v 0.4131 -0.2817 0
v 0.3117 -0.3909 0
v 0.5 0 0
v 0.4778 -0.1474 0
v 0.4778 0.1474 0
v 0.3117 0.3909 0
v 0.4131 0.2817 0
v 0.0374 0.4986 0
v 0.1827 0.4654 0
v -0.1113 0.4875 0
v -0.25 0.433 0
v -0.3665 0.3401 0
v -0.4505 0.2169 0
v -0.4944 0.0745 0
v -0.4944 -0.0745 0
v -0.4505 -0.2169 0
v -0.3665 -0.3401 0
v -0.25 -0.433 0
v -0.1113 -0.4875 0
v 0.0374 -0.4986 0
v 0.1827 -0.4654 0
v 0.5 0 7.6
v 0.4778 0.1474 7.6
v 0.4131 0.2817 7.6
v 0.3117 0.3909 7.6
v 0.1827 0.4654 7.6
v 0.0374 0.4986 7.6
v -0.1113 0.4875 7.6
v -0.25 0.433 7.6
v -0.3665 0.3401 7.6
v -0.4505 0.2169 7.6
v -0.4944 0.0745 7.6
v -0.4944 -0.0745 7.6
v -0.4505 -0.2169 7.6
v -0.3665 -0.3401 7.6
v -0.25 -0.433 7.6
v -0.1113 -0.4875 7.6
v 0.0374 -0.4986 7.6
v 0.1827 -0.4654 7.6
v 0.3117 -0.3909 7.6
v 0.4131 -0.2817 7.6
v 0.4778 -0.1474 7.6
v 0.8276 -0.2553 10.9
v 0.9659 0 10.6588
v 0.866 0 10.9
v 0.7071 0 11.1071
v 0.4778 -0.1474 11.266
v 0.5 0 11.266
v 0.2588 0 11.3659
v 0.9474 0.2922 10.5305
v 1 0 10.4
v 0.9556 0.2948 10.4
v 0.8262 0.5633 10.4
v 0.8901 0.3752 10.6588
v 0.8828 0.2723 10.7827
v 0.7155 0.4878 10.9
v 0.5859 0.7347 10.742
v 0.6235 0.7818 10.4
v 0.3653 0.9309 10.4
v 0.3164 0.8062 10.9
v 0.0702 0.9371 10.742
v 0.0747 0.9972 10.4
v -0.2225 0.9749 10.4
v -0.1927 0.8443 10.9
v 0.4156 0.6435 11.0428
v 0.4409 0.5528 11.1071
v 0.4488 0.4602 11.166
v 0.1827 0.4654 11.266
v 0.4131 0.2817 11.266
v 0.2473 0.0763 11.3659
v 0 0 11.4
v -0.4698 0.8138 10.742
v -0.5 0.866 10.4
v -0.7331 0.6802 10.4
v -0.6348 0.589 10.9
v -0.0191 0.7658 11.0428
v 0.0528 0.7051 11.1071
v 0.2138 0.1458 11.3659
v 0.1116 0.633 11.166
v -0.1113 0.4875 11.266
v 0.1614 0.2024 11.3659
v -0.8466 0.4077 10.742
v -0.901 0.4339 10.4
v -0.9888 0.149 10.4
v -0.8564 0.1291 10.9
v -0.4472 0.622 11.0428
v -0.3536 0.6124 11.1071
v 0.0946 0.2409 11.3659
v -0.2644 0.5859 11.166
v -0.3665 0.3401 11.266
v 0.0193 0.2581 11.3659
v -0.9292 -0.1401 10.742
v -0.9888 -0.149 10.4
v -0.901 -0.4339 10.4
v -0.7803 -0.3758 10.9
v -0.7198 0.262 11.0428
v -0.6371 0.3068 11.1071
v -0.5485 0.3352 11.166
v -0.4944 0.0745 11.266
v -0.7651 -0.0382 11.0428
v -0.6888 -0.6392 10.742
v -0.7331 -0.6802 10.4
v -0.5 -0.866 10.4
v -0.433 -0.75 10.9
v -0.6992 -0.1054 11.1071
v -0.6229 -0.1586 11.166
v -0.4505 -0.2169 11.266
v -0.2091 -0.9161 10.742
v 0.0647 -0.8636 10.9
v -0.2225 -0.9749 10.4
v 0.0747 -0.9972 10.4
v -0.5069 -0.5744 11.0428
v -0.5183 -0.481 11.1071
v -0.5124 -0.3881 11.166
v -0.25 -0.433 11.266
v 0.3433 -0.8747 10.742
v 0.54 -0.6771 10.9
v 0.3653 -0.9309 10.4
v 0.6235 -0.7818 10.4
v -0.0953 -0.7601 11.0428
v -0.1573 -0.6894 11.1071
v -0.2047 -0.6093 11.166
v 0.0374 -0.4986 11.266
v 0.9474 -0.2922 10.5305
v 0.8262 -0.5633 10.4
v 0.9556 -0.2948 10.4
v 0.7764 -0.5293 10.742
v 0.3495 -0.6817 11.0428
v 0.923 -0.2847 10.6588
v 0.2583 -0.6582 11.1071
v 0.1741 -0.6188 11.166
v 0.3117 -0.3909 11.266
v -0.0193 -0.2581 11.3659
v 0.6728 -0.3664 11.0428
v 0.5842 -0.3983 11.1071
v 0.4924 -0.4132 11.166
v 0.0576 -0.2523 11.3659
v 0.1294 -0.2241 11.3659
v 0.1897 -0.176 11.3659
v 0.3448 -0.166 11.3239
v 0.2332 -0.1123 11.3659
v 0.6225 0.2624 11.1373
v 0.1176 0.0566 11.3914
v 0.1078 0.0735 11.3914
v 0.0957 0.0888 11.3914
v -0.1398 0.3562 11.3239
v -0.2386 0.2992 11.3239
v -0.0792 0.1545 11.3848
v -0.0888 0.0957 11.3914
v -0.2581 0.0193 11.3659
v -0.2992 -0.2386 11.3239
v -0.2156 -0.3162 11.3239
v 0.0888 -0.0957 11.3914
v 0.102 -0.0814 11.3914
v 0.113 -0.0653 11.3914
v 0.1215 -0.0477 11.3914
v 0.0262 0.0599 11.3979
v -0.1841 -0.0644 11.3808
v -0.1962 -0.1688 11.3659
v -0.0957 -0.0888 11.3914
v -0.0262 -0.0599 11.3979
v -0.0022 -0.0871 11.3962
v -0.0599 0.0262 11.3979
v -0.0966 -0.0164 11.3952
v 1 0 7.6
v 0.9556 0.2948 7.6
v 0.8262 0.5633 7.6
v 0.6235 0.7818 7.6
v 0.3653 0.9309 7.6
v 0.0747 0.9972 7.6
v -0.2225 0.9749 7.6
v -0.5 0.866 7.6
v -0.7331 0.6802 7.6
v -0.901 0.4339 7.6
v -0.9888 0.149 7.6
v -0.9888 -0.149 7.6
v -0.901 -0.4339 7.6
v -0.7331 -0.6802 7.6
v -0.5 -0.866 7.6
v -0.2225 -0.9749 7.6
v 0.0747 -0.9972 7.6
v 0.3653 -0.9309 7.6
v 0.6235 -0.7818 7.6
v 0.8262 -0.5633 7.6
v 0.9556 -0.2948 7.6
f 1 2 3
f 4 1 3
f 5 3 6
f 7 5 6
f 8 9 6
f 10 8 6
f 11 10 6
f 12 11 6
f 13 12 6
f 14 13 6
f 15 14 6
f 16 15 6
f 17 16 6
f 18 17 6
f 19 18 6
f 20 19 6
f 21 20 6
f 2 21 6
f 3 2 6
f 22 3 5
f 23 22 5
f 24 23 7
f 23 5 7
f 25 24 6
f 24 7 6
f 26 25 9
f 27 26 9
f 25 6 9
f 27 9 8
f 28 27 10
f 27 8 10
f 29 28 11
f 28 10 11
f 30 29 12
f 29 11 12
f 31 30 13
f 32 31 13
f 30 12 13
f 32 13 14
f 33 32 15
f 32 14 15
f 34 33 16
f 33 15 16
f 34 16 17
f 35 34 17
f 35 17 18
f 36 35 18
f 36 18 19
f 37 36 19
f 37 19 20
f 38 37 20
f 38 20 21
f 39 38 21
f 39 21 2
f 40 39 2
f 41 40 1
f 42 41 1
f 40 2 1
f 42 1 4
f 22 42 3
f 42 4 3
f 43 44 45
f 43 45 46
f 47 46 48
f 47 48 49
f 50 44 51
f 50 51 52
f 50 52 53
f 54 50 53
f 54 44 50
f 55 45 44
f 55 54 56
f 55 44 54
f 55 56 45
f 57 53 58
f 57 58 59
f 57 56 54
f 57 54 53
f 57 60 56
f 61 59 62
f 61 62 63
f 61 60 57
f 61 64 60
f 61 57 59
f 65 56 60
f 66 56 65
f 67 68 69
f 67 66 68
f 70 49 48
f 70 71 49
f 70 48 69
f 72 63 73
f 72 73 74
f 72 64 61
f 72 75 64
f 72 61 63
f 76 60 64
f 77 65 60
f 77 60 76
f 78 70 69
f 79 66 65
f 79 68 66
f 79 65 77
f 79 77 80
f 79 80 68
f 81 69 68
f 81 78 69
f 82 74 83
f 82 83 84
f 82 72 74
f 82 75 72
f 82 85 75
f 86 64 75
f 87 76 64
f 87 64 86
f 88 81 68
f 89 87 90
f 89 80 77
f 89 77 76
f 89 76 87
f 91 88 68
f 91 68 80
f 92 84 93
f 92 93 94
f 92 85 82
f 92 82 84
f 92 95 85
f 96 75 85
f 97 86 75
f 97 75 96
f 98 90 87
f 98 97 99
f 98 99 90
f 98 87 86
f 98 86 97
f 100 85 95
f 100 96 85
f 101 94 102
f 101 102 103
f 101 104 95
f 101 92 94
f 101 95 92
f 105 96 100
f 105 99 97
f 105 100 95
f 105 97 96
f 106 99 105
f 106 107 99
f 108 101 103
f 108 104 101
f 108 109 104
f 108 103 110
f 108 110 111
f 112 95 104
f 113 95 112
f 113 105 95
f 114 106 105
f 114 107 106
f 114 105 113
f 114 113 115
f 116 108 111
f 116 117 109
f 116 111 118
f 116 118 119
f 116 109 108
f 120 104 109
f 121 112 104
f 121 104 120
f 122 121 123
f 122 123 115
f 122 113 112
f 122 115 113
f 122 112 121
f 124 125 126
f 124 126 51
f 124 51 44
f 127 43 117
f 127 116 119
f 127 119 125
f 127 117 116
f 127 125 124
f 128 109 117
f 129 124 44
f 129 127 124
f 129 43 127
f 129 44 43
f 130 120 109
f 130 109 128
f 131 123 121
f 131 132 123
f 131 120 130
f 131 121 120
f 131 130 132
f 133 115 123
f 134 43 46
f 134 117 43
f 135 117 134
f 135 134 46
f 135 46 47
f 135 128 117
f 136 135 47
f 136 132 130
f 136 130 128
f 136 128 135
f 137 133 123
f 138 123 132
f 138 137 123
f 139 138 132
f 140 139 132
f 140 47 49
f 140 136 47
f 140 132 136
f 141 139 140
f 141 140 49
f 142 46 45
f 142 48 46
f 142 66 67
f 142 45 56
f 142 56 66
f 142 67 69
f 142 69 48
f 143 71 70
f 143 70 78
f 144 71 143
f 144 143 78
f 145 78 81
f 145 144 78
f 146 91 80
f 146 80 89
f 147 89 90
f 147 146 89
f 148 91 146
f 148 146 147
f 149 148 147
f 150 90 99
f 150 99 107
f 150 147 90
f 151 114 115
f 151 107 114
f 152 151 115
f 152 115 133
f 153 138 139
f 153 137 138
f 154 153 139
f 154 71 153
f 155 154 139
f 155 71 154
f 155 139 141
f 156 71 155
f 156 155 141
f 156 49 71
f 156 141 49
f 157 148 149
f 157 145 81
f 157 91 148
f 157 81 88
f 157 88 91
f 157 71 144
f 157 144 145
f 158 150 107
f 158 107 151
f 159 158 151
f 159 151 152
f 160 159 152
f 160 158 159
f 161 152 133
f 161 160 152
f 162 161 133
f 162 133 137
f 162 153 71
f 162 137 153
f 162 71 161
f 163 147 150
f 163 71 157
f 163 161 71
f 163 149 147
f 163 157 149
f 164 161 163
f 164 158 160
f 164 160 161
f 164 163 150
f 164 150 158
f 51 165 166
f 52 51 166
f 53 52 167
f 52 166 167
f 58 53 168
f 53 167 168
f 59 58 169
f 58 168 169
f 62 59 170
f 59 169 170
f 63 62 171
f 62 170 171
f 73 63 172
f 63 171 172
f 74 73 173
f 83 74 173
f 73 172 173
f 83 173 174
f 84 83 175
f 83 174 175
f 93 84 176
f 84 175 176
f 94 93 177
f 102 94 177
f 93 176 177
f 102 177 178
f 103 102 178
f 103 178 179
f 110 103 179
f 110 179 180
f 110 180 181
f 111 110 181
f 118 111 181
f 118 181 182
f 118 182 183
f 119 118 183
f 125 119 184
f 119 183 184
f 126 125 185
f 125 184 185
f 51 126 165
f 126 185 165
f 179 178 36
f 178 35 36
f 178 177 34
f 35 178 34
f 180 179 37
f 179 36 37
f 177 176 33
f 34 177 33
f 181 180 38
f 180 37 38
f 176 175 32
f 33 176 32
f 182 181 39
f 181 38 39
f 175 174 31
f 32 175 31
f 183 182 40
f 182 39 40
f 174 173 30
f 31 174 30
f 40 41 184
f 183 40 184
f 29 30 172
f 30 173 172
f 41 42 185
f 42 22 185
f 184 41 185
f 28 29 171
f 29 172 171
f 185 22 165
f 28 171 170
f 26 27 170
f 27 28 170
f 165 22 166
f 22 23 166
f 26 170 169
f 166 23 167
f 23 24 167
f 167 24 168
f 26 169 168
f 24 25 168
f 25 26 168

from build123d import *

# Parameters (mm, degrees)
F0_R     = 0.5
F1_DEPTH = 7.6
F2_R     = 1
F2_R_2   = 0.5
F3_DEPTH = 2.8


with BuildPart() as f1:
    # F0 (on Top) → F1 (new body)
    with BuildSketch(Plane.XY):
        Circle(F0_R)
    extrude(amount=F1_DEPTH)

    # F2 (on face) → F3 (join)
    with BuildSketch(Plane.XY.offset(7.6)):
        Circle(F2_R)
        Circle(F2_R_2, mode=Mode.SUBTRACT)
        Circle(F2_R_2)
    extrude(amount=F3_DEPTH)

    # F4 (on Front) → F5 (revolve)
    with BuildSketch(Plane.XZ):
        with BuildLine():
            Line((0, 10.4), (1, 10.4))
            ThreePointArc((1, 10.4), (0.707107, 11.107107), (0, 11.4))
            Line((0, 11.4), (0, 10.4))
        make_face()
    revolve(axis=Axis((0, 0, 7.5), (0, 0, 1)))


solid = f1.part
